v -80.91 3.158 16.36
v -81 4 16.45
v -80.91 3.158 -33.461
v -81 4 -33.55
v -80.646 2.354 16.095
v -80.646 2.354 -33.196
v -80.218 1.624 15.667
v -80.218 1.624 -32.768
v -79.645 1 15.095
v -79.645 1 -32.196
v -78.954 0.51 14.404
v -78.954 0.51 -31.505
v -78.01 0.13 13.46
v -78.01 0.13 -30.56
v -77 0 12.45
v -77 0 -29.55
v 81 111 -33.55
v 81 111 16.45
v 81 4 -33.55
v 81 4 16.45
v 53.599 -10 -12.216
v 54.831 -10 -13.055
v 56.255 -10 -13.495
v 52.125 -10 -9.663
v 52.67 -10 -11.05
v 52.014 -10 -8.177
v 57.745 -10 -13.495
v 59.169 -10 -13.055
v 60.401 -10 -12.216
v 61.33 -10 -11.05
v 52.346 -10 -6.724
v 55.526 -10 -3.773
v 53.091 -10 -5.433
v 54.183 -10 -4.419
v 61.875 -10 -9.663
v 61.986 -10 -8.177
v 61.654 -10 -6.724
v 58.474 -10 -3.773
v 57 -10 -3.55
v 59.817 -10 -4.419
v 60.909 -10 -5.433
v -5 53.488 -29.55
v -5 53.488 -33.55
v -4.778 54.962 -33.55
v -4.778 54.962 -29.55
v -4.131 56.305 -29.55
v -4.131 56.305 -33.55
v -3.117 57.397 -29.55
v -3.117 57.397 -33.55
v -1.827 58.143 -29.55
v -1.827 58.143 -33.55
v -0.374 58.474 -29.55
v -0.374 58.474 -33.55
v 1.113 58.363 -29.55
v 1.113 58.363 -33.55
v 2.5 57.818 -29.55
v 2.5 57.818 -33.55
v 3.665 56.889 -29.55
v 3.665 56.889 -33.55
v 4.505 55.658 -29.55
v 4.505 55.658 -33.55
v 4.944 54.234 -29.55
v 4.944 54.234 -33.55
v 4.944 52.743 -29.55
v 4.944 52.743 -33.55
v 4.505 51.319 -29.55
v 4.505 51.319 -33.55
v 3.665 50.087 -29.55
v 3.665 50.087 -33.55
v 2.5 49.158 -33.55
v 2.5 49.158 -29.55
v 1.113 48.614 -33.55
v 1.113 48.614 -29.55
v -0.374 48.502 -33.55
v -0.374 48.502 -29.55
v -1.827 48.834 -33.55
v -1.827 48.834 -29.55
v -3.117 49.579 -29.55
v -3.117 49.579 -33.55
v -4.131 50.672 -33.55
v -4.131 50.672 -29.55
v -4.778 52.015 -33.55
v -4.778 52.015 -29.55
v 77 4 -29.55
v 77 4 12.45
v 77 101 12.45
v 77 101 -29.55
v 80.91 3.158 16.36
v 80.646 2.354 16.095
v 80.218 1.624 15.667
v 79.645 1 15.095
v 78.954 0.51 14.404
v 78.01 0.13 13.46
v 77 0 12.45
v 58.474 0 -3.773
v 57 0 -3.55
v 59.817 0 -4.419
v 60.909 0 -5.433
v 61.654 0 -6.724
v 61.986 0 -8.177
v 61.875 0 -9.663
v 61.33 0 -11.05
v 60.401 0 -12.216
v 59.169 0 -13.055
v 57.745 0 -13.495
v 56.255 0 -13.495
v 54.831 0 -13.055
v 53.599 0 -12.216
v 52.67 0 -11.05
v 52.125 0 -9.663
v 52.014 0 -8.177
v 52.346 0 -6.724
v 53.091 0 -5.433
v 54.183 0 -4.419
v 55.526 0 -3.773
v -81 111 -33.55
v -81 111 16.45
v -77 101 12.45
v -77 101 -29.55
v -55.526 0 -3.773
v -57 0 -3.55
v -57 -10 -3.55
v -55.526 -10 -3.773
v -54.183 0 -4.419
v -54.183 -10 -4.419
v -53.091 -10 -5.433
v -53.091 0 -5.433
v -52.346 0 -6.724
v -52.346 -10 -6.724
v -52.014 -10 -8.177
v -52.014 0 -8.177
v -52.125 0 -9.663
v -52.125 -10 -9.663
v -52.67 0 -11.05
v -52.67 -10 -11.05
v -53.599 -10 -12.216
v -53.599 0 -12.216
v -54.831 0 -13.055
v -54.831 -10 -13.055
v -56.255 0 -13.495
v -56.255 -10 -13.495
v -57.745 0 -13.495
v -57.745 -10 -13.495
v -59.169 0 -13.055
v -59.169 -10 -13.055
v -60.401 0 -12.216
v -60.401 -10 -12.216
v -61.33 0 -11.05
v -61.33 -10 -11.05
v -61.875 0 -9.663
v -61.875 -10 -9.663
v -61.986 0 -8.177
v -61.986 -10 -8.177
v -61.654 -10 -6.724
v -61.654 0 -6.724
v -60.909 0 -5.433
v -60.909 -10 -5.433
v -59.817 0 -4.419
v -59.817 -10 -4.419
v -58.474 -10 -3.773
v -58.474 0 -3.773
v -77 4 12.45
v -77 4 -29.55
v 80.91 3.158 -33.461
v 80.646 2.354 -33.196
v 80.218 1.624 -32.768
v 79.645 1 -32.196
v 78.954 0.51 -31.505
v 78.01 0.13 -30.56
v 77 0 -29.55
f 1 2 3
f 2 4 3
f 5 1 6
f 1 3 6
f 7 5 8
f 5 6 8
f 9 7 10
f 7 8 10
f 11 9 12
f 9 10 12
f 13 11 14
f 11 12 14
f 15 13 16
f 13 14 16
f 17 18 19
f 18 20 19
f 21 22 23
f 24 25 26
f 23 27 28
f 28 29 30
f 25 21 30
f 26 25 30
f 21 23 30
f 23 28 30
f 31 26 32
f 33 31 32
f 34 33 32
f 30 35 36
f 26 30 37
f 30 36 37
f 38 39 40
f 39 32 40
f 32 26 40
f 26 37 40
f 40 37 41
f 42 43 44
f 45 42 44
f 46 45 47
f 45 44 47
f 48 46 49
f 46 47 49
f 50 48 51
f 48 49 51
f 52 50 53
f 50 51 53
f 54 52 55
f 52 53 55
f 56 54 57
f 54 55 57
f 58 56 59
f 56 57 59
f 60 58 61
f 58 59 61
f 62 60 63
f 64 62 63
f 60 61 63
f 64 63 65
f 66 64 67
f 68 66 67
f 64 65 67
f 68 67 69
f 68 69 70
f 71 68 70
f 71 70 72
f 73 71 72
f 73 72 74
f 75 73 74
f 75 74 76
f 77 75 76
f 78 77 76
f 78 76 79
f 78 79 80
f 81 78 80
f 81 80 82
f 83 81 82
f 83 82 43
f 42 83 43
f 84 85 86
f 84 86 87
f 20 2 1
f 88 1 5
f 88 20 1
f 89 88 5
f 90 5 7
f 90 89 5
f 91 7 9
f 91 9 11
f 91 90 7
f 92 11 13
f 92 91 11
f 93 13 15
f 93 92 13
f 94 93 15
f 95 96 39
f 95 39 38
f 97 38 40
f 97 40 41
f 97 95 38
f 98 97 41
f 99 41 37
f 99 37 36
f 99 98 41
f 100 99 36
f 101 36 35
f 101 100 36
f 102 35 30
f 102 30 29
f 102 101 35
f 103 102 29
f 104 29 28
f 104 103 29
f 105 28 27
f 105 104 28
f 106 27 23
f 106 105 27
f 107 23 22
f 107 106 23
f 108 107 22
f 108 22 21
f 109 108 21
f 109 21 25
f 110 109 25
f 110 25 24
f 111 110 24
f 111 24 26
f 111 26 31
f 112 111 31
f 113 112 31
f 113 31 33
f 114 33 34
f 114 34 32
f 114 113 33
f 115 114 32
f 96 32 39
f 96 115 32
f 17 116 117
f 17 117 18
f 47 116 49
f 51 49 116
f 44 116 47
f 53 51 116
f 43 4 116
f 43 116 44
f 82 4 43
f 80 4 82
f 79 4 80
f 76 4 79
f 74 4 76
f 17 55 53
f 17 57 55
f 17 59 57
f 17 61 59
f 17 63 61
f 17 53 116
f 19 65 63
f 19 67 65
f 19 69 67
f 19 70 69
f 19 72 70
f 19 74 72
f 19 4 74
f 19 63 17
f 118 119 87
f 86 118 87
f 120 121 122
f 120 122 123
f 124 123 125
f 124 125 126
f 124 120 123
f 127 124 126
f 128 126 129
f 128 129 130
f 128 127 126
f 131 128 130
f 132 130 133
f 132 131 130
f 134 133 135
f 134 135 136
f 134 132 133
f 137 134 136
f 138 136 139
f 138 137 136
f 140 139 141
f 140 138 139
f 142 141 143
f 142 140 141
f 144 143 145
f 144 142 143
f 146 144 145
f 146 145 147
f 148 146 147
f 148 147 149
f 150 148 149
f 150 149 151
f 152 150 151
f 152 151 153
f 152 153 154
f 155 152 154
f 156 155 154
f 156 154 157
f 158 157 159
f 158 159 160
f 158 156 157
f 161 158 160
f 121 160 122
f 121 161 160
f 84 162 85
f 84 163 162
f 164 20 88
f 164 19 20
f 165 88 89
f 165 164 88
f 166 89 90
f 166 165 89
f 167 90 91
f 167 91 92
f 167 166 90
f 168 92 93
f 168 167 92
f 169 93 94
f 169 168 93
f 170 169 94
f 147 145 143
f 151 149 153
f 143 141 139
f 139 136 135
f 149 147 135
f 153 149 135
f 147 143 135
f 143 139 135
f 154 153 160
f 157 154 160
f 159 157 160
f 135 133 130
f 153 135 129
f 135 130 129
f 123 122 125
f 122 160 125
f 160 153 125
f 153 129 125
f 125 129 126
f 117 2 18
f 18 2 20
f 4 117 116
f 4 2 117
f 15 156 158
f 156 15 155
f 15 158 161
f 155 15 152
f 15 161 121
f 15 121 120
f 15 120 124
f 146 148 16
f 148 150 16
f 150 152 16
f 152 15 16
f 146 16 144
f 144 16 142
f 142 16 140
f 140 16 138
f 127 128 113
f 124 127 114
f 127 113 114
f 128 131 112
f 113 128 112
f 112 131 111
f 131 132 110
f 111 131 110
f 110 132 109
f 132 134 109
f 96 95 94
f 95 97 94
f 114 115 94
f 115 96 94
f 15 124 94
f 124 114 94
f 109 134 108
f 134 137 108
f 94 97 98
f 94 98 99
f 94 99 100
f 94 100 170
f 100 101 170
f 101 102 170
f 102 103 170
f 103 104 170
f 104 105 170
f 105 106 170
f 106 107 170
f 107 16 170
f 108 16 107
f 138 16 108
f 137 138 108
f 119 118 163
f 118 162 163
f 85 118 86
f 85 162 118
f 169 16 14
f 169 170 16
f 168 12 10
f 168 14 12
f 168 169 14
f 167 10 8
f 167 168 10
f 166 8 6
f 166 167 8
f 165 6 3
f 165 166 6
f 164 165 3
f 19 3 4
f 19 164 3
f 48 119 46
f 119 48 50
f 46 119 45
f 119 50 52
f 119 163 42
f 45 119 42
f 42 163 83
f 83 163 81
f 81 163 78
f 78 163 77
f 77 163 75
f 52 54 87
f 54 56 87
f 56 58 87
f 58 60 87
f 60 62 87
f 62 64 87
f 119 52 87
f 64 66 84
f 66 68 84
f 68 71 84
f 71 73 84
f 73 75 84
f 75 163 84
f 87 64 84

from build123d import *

# Parameters (mm, degrees)
SKETCH1_R             = 5
BOSS_EXTRUDE1_DEPTH   = 10
BOSS_EXTRUDE1_2_DEPTH = 10
SKETCH1_3_W           = 162
SKETCH1_3_H           = 50
BOSS_EXTRUDE2_DEPTH   = 4
SKETCH1_4_W           = 162
SKETCH1_4_H           = 50
SKETCH1_4_W_2         = 154
SKETCH1_4_H_2         = 42
BOSS_EXTRUDE3_DEPTH   = 96
FILLET1_R             = 4
SKETCH2_W             = 162
SKETCH2_H             = 50
SKETCH2_W_2           = 154
SKETCH2_H_2           = 42
BOSS_EXTRUDE4_DEPTH   = 5
SKETCH2_2_W           = 162
SKETCH2_2_H           = 50
SKETCH2_2_W_2         = 154
SKETCH2_2_H_2         = 42
BOSS_EXTRUDE5_DEPTH   = 5
SKETCH3_R             = 5
CUT_EXTRUDE1_DEPTH    = 10
SKETCH4_W             = 162
SKETCH4_H             = 50
BOSS_EXTRUDE6_DEPTH   = 10


with BuildPart() as part:
    # Sketch1 → Boss-Extrude1 (new body)
    with BuildSketch(Plane(origin=(0, 0, 0), x_dir=(1, 0, 0), z_dir=(0, 1, 0))):
        with Locations((-57, 8.550438596)):
            Circle(SKETCH1_R)
    extrude(amount=-BOSS_EXTRUDE1_DEPTH)



with BuildPart() as body_2:
    # Sketch1 → Boss-Extrude1 2 (new body)
    with BuildSketch(Plane(origin=(0, 0, 0), x_dir=(1, 0, 0), z_dir=(0, 1, 0))):
        with Locations((57, 8.550438596)):
            Circle(SKETCH1_R)
    extrude(amount=-BOSS_EXTRUDE1_2_DEPTH)


with BuildPart() as part_1:
    add(part.part)

    add(body_2.part)  # Boss-Extrude2 merges body 2
    # Sketch1<3> → Boss-Extrude2 (add)
    with BuildSketch(Plane(origin=(0, 0, 0), x_dir=(1, 0, 0), z_dir=(0, 1, 0))):
        with Locations((0, 8.550438596)):
            Rectangle(SKETCH1_3_W, SKETCH1_3_H)
    extrude(amount=BOSS_EXTRUDE2_DEPTH)

    # Sketch1<4> → Boss-Extrude3 (add)
    with BuildSketch(Plane(origin=(0, 0, 0), x_dir=(1, 0, 0), z_dir=(0, 1, 0))):
        with Locations((0, 8.550438596)):
            Rectangle(SKETCH1_4_W, SKETCH1_4_H)
        with Locations((0, 8.550438596)):
            Rectangle(SKETCH1_4_W_2, SKETCH1_4_H_2, mode=Mode.SUBTRACT)
    extrude(amount=BOSS_EXTRUDE3_DEPTH)

    # Fillet1
    fillet1_edges = [part_1.edges().sort_by_distance(p)[0] for p in [
        (0, 0, -33.550438596),
        (-81, 0, -8.550438596),
        (81, 0, -8.550438596),
        (0, 0, 16.449561404),
    ]]
    fillet(fillet1_edges, radius=FILLET1_R)



with BuildPart() as body_2_2:
    # Sketch2 → Boss-Extrude4 (new body)
    with BuildSketch(Plane(origin=(0, 96, 0), x_dir=(1, 0, 0), z_dir=(0, 1, 0))):
        with Locations((0, 8.550438596)):
            Rectangle(SKETCH2_W, SKETCH2_H)
        with Locations((0, 8.550438596)):
            Rectangle(SKETCH2_W_2, SKETCH2_H_2, mode=Mode.SUBTRACT)
    extrude(amount=BOSS_EXTRUDE4_DEPTH)


with BuildPart() as part_2:
    add(part_1.part)

    add(body_2_2.part)  # Boss-Extrude5 merges body 2 2
    # Sketch2<2> → Boss-Extrude5 (add)
    with BuildSketch(Plane(origin=(0, 96, 0), x_dir=(1, 0, 0), z_dir=(0, 1, 0))):
        with Locations((0, 8.550438596)):
            Rectangle(SKETCH2_2_W, SKETCH2_2_H)
        with Locations((0, 8.550438596)):
            Rectangle(SKETCH2_2_W_2, SKETCH2_2_H_2, mode=Mode.SUBTRACT)
    extrude(amount=BOSS_EXTRUDE5_DEPTH)

    # Sketch3 → Cut-Extrude1 (cut)
    with BuildSketch(Plane(origin=(0, 0, -33.550438596), x_dir=(-1, 0, 0), z_dir=(0, 0, -1))):
        with Locations((0, 53.488312156)):
            Circle(SKETCH3_R)
    extrude(amount=-CUT_EXTRUDE1_DEPTH, mode=Mode.SUBTRACT)

    # Sketch4 → Boss-Extrude6 (add)
    with BuildSketch(Plane(origin=(0, 101, 0), x_dir=(1, 0, 0), z_dir=(0, 1, 0))):
        with Locations((0, 8.550438596)):
            Rectangle(SKETCH4_W, SKETCH4_H)
    extrude(amount=BOSS_EXTRUDE6_DEPTH)


solid = part_2.part
